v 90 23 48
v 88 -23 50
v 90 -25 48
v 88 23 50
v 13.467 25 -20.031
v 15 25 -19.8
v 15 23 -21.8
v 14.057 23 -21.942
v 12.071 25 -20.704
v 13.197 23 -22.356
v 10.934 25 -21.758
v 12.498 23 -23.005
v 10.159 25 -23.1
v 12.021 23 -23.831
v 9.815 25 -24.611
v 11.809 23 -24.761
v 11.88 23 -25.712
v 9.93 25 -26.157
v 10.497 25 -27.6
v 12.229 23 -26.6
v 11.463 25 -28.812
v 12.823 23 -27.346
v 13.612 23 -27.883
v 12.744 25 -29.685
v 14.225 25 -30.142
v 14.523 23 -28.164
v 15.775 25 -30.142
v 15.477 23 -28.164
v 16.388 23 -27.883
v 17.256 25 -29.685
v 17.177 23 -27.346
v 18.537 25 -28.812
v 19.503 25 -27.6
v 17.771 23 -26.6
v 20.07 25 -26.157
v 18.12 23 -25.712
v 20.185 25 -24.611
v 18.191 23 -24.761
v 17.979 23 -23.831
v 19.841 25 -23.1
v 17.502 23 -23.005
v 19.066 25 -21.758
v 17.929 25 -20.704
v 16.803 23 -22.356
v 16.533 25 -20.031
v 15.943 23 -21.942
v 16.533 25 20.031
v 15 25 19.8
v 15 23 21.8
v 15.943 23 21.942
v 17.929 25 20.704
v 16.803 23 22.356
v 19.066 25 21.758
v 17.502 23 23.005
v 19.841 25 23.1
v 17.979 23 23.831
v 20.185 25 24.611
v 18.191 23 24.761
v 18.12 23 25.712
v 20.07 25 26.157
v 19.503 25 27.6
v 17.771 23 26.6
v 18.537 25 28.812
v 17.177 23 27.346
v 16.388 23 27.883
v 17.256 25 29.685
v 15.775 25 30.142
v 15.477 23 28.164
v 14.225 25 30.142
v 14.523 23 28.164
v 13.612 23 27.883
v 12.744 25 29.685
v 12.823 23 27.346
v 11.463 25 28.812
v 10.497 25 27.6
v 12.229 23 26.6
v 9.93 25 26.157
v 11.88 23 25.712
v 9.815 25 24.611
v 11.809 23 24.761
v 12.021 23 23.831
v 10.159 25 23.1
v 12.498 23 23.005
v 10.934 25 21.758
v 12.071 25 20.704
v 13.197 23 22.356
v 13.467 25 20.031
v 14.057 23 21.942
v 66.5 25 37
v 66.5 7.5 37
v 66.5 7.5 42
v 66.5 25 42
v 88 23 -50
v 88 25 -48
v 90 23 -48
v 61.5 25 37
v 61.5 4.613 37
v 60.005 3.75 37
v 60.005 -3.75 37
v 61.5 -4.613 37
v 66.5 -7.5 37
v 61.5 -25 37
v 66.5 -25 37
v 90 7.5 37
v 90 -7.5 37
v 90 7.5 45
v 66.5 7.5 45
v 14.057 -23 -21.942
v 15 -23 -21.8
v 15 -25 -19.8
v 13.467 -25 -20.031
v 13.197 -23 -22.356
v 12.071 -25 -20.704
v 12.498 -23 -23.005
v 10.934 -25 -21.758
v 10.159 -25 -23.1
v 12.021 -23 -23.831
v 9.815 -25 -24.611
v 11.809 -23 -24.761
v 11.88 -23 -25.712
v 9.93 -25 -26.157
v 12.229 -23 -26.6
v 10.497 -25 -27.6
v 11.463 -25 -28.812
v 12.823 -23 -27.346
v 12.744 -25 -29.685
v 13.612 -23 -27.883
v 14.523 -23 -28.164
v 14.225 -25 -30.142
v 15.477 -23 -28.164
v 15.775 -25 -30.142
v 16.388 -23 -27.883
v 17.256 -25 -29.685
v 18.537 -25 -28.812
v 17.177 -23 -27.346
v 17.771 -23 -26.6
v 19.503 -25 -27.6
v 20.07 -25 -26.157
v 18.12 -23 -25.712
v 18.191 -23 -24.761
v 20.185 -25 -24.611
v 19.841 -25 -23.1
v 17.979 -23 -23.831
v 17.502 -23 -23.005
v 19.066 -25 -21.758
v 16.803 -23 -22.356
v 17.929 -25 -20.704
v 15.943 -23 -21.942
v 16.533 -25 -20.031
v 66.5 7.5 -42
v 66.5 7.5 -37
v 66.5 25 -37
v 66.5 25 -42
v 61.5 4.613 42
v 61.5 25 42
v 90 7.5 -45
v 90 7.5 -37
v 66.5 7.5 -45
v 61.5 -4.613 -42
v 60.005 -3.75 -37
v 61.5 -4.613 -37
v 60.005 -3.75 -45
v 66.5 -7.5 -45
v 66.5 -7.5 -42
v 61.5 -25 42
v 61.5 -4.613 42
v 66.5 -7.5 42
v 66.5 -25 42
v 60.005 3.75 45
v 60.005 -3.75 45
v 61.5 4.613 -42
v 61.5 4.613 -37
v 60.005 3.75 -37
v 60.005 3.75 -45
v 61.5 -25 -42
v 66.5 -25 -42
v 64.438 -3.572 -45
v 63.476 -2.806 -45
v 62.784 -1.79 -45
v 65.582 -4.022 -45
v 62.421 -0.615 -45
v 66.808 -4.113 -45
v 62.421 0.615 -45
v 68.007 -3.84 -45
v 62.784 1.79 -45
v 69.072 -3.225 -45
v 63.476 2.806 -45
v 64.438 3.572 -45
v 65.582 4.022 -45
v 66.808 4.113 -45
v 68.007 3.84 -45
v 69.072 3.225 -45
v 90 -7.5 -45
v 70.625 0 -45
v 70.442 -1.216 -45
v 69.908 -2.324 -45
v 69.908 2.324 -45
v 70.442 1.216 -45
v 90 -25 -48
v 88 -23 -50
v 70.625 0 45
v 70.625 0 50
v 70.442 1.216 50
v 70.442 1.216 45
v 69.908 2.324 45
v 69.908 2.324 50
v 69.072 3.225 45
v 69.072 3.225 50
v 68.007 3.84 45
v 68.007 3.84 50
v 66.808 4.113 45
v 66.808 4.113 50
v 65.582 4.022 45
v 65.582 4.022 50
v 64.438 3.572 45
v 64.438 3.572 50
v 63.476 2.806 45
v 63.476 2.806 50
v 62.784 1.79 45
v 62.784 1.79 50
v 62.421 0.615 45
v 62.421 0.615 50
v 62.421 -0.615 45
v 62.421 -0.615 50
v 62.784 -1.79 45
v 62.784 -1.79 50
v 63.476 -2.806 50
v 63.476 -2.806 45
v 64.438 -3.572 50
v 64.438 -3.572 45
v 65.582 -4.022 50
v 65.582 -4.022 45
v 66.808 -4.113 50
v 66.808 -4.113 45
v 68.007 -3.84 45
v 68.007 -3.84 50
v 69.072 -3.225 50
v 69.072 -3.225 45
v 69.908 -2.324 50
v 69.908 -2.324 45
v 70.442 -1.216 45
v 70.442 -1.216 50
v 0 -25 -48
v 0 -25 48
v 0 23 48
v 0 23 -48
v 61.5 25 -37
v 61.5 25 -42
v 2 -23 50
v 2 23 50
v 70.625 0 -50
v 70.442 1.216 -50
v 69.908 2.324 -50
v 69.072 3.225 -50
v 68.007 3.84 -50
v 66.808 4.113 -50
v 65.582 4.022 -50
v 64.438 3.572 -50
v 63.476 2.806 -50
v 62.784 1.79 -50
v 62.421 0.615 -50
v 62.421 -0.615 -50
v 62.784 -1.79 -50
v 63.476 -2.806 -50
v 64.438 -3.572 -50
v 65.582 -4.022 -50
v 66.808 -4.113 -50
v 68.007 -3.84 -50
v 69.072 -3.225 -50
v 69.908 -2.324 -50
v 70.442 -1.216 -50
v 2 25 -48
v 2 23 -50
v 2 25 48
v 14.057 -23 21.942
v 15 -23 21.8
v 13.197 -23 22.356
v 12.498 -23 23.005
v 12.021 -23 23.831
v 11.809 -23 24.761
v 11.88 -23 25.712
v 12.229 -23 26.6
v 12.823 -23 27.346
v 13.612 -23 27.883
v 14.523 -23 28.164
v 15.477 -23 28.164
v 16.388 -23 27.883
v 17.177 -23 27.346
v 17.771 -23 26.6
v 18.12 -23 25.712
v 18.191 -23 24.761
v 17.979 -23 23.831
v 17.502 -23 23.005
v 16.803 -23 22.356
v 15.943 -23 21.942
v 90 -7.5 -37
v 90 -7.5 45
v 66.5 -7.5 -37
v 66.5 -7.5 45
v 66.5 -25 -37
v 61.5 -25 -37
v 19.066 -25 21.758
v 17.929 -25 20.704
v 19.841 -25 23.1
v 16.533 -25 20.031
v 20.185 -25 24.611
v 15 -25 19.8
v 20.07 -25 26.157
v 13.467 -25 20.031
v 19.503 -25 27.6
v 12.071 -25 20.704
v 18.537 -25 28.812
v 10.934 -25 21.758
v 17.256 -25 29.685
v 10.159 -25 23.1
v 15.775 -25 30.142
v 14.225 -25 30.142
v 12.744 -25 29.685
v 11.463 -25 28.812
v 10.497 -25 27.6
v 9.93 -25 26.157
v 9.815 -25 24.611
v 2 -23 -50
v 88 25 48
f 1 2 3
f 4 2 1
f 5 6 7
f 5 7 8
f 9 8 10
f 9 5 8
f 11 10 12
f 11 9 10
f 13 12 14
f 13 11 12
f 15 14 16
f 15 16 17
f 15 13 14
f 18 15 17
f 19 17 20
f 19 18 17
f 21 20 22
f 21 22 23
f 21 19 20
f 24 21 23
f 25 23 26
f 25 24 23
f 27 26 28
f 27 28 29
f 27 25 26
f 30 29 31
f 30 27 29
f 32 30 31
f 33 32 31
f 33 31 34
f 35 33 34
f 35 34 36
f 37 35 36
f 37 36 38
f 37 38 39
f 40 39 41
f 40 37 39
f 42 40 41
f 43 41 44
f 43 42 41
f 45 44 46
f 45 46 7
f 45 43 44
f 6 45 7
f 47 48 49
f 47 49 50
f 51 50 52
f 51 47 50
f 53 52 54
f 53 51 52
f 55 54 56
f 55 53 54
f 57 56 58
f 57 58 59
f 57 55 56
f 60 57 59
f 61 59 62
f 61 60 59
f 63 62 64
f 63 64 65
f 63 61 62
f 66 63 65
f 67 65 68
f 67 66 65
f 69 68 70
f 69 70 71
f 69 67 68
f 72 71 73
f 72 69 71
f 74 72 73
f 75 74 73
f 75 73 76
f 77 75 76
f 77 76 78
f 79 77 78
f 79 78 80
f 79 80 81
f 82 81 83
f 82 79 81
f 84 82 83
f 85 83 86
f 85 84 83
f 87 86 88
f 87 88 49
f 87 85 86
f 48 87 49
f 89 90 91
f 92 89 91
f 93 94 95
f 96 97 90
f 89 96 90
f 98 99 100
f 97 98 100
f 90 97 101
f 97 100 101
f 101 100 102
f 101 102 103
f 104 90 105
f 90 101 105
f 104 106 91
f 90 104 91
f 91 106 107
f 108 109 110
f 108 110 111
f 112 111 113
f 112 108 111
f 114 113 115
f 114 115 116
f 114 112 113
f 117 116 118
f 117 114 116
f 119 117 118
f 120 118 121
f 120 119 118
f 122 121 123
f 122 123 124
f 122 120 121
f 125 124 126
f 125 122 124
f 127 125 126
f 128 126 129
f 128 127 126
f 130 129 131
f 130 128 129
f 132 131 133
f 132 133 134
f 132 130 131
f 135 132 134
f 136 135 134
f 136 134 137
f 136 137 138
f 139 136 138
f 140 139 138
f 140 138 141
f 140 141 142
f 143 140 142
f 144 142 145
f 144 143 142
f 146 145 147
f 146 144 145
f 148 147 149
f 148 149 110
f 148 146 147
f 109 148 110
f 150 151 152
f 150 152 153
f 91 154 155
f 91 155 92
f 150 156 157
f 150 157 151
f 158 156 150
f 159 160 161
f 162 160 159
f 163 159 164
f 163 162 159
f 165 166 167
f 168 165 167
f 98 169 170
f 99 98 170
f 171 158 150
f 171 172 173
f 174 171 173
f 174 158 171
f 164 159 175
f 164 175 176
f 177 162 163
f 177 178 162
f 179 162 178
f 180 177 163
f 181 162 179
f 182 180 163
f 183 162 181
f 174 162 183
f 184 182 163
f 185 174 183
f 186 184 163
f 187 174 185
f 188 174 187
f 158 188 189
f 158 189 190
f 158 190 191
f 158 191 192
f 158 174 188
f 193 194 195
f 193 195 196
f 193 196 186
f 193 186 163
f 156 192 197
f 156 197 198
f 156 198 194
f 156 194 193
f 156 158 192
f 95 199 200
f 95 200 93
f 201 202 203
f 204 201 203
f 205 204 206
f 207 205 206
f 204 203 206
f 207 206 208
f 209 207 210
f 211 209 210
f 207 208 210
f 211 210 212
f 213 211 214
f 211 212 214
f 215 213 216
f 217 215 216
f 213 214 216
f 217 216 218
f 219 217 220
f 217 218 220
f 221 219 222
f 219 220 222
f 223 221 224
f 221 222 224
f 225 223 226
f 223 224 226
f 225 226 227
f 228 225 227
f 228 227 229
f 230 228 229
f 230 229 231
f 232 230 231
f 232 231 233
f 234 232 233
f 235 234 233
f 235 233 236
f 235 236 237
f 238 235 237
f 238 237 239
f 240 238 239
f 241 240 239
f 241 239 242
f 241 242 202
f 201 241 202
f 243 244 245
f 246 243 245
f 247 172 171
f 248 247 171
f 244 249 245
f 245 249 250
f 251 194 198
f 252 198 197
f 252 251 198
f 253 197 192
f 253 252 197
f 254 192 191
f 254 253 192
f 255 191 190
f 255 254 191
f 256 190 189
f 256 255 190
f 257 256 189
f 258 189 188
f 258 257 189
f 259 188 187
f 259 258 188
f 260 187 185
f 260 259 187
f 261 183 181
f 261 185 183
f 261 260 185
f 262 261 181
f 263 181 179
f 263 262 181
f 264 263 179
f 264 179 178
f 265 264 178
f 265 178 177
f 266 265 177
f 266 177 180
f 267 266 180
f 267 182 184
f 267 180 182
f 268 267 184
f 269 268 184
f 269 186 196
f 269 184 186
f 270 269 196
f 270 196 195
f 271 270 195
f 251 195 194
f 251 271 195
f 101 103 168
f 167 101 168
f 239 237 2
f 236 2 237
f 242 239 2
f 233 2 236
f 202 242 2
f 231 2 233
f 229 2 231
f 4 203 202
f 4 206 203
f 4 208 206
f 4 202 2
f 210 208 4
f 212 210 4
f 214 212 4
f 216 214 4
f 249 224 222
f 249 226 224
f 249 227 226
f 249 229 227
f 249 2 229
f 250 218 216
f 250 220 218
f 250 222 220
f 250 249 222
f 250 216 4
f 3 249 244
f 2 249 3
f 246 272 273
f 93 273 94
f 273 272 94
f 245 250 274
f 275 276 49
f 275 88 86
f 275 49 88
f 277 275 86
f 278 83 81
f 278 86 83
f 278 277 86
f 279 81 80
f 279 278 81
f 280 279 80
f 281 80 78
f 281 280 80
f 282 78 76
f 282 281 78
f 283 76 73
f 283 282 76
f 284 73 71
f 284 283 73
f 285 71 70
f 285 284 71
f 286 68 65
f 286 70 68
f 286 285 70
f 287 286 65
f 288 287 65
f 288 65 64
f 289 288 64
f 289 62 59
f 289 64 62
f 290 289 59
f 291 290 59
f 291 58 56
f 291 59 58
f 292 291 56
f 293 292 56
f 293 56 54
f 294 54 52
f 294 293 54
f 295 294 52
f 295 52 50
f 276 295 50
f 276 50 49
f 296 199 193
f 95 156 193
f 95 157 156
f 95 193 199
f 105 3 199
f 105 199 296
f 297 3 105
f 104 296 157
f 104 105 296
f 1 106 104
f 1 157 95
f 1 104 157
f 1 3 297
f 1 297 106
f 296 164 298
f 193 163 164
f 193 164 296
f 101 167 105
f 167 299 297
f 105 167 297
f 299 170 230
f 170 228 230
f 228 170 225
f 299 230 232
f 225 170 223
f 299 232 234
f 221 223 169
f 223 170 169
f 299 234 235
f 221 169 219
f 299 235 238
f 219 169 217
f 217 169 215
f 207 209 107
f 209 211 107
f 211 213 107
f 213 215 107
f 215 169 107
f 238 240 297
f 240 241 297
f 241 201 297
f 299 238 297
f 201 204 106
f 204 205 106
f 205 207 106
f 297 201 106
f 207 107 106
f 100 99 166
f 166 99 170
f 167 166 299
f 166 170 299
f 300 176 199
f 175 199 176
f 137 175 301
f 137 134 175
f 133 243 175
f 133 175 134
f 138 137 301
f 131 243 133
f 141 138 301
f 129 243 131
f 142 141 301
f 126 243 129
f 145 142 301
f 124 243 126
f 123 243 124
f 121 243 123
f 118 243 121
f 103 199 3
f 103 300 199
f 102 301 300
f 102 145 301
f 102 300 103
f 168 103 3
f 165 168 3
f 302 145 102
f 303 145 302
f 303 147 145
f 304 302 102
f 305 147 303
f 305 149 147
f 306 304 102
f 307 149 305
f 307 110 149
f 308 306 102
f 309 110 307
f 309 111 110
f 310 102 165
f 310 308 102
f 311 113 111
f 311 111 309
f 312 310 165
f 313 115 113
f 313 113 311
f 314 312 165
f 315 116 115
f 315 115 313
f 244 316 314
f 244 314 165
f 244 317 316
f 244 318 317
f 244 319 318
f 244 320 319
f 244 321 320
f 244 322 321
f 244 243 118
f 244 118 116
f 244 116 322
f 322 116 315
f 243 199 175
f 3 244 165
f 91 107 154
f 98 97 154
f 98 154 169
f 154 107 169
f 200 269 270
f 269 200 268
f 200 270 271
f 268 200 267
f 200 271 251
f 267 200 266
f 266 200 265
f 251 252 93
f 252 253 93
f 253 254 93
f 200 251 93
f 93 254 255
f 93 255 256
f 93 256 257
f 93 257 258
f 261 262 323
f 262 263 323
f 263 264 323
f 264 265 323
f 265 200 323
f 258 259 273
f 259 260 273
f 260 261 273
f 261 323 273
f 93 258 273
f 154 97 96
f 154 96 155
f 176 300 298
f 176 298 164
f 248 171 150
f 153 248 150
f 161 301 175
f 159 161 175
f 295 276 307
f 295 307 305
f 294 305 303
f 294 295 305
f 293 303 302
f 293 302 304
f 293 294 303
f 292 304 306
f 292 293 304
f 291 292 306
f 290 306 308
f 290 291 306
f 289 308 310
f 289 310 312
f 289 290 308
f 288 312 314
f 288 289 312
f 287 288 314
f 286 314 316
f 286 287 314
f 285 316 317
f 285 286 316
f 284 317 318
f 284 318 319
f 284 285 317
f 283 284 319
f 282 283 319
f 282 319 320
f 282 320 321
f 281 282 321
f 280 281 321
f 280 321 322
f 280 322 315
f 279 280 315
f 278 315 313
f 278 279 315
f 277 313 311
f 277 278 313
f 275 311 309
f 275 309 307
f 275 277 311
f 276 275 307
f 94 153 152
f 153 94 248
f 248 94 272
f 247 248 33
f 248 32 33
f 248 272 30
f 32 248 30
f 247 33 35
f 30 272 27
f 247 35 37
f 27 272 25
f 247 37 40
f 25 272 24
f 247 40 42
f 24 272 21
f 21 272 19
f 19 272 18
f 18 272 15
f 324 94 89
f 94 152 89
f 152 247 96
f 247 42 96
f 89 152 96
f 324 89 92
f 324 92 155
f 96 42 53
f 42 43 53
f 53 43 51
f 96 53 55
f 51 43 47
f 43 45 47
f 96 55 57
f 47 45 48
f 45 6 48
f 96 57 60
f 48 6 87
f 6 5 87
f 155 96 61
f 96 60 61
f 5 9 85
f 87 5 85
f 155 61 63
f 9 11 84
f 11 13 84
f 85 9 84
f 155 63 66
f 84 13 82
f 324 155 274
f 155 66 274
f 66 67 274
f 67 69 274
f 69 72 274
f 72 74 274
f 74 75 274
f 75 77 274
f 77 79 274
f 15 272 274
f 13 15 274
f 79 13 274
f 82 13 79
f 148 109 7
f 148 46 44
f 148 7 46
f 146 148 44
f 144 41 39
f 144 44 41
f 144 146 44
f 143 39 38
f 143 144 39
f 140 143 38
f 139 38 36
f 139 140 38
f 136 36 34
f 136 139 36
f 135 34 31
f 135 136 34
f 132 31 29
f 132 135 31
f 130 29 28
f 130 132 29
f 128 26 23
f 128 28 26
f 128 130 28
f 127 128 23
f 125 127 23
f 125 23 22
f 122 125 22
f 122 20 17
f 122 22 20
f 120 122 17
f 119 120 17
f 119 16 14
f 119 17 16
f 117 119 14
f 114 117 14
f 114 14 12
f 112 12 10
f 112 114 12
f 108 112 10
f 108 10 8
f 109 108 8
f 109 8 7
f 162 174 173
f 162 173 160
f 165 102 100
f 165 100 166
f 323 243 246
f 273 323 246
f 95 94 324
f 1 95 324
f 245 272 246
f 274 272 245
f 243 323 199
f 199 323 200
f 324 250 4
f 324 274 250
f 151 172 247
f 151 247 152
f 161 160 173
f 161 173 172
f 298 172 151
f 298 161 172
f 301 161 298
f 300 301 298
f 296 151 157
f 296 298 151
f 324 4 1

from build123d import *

# Parameters (mm, degrees)
SKETCH1_W               = 50
SKETCH1_H               = 100
BOSS_EXTRUDE1_DEPTH     = 90
CUT_EXTRUDE1_DEPTH      = 115.455231423
CUT_EXTRUDE1_DEPTH_BACK = 115.455231423
SKETCH2_R               = 3.2
CHAMFER1_SIZE           = 2
CUT_EXTRUDE2_START      = -5
SKETCH3_W               = 28.111922991
SKETCH3_H               = 15
CUT_EXTRUDE2_DEPTH      = 8
SKETCH4_R               = 4.125
CUT_EXTRUDE3_DEPTH      = 8
SKETCH6_W               = 5
SKETCH6_H               = 5
CUT_EXTRUDE4_DEPTH      = 108.964114408


with BuildPart() as part:
    # Sketch1 → Boss-Extrude1 (new body)
    with BuildSketch(Plane.YZ):
        Rectangle(SKETCH1_W, SKETCH1_H)
    extrude(amount=BOSS_EXTRUDE1_DEPTH)

    # Sketch2 → Cut-Extrude1 (cut, two sides: drawn at the far end of the back side and taken through both)
    with BuildSketch(Plane(origin=(0, 25, 0), x_dir=(-1, 0, 0), z_dir=(0, 1, 0)).offset(-CUT_EXTRUDE1_DEPTH_BACK)):
        with Locations(Location((-15, -25, 0), (0, 0, 90))):
            Circle(SKETCH2_R)
        with Locations(Location((-15, 25, 0), (0, 0, 270))):
            Circle(SKETCH2_R)
    extrude(amount=CUT_EXTRUDE1_DEPTH + CUT_EXTRUDE1_DEPTH_BACK, mode=Mode.SUBTRACT)

    # Chamfer1
    chamfer1_edges = [part.edges().sort_by_distance(p)[0] for p in [
        (45, 25, 50),
        (45, -25, 50),
        (0, 0, 50),
        (90, 0, 50),
        (45, 25, -50),
        (0, 25, 0),
        (90, 25, 0),
        (15, 25, -28.2),
        (15, 25, 28.2),
        (45, -25, -50),
        (15, -25, 28.2),
        (15, -25, -28.2),
        (0, 0, -50),
        (90, 0, -50),
    ]]
    chamfer(chamfer1_edges, length=CHAMFER1_SIZE)

    # Sketch3 → Cut-Extrude2 (cut)
    with BuildSketch(Plane.XY.offset(50).offset(CUT_EXTRUDE2_START)):
        Polygon((66.5, 7.5), (72.995190528, 3.75), (72.995190528, -3.75), (66.5, -7.5), (88, -7.5), (88, 7.5), align=None)
        with Locations((102.055961496, 0)):
            Rectangle(SKETCH3_W, SKETCH3_H)
        Polygon((66.5, -7.5), (72.995190528, -3.75), (72.995190528, 3.75), (66.5, 7.5), (60.004809472, 3.75), (60.004809472, -3.75), align=None)
    cut_extrude2 = extrude(amount=-CUT_EXTRUDE2_DEPTH, mode=Mode.SUBTRACT)

    # Sketch4 → Cut-Extrude3 (cut)
    with BuildSketch(Plane.XY.offset(50)):
        with Locations((66.5, 0)):
            Circle(SKETCH4_R)
    cut_extrude3 = extrude(amount=-CUT_EXTRUDE3_DEPTH, mode=Mode.SUBTRACT)

    # Sketch6 → Cut-Extrude4 (cut, symmetric)
    with BuildSketch(Plane.XZ.offset(-7.5)):
        with Locations((64, 39.5)):
            Rectangle(SKETCH6_W, SKETCH6_H)
    cut_extrude4 = extrude(amount=CUT_EXTRUDE4_DEPTH, both=True, mode=Mode.SUBTRACT)

    # Mirror1: Cut-Extrude2, Cut-Extrude3, Cut-Extrude4 across plane
    add(cut_extrude2.mirror(Plane.XY), mode=Mode.SUBTRACT)
    add(cut_extrude3.mirror(Plane.XY), mode=Mode.SUBTRACT)
    add(cut_extrude4.mirror(Plane.XY), mode=Mode.SUBTRACT)


solid = part.part
